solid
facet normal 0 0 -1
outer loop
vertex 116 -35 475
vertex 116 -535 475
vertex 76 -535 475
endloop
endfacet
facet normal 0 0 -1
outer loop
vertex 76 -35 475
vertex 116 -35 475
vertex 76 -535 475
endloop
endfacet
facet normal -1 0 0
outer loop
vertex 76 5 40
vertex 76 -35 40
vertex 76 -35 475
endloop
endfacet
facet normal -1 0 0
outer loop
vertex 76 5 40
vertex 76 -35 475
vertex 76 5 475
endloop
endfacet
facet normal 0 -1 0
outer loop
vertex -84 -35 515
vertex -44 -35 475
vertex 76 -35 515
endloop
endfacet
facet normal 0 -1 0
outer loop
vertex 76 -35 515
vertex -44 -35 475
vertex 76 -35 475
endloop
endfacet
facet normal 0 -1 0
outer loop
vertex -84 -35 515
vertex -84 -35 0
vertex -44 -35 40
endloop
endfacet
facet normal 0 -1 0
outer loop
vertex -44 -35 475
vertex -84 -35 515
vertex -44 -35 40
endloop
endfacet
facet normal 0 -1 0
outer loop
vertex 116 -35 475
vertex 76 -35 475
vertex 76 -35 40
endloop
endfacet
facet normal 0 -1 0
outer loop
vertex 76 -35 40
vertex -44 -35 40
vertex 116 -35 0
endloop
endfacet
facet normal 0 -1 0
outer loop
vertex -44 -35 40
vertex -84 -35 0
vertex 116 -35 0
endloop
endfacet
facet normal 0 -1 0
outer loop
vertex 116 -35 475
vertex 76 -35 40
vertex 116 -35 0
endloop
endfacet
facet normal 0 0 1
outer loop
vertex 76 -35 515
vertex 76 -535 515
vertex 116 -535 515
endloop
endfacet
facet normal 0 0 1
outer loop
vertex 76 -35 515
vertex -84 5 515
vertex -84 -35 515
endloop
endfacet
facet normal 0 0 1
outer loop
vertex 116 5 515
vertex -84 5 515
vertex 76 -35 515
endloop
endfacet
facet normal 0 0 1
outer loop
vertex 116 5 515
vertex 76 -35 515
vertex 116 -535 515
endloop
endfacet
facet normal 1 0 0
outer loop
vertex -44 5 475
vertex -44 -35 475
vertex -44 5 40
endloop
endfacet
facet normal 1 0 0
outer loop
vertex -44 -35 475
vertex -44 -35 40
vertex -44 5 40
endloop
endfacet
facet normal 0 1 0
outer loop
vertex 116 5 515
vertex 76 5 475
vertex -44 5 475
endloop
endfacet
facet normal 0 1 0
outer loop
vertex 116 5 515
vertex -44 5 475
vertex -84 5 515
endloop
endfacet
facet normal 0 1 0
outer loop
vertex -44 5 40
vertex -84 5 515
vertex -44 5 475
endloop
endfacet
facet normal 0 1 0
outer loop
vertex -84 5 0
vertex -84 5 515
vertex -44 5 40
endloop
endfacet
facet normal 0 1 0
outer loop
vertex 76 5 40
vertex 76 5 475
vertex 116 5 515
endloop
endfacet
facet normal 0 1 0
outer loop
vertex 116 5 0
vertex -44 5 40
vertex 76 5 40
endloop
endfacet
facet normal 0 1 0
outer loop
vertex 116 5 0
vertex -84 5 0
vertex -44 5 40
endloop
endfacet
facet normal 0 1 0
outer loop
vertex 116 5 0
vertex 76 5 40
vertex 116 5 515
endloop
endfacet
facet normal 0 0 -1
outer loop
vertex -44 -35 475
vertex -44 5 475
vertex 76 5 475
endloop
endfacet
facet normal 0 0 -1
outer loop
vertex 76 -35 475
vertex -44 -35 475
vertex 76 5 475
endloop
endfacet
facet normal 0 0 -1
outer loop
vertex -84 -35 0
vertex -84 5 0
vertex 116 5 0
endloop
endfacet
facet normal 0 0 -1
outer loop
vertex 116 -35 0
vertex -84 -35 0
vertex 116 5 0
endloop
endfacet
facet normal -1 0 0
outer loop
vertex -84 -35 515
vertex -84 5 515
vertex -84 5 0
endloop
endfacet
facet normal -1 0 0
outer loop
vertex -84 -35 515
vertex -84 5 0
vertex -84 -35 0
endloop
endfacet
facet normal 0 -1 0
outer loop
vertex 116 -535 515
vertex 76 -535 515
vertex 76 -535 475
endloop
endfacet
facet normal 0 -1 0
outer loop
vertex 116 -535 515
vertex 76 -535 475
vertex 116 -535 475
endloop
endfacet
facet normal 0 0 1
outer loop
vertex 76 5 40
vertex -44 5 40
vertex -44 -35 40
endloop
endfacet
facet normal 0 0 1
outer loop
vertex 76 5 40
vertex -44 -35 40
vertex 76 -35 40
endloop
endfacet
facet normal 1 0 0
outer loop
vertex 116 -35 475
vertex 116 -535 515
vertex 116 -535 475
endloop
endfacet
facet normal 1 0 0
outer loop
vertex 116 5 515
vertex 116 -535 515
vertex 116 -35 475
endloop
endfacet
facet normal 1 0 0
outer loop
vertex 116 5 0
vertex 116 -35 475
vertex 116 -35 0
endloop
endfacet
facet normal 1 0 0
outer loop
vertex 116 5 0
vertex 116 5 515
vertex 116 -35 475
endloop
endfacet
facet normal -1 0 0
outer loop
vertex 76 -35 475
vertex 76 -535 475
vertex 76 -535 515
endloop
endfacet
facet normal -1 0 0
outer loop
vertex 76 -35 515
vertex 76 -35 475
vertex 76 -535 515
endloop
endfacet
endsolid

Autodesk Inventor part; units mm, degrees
ref_plane "YZ Plane" through (0, 0, 0) normal (1, 0, 0) x (0, 1, 0)
ref_plane "XZ Plane" through (0, 0, 0) normal (0, 1, 0) x (-1, 0, 0)
sketch "Skizze1" plane through (0, 0, 0) normal (0, 0, 1) x (1, 0, 0)
  line L0 (0, 0) -> (32, 0) construction
  line L1 (-84, 5) -> (-84, -35)
  line L2 (-84, -35) -> (116, -35)
  line L3 (116, -35) -> (116, 5)
  line L4 (-84, 5) -> (116, 5)
  line L5 (0, 0) -> (-84, 0) construction
  line L6 (32, 0) -> (116, 0) construction
  point P0 (16, 5)
  dimension "d0" = 200
  dimension "d1" = 40
  dimension "d2" = 5
extrude "Extrusion1" add sketch "Skizze1" along normal blind 40
sketch "Skizze2" plane through (0, 0, 40) normal (0, 0, 1) x (1, 0, 0)
  line L0 (116, -35) -> (116, 5) projected
  line L1 (-84, 5) -> (-84, -35) projected
  line L2 (116, -35) -> (76, -35)
  line L3 (76, -35) -> (76, 5)
  line L4 (76, 5) -> (116, 5)
  line L5 (-84, -35) -> (-44, -35)
  line L6 (-44, -35) -> (-44, 5)
  line L7 (-44, 5) -> (-84, 5)
  point P0 (0, 0)
extrude "Extrusion2" add sketch "Skizze2" along normal blind 475
sketch "Skizze3" plane through (0, 0, 515) normal (0, 0, 1) x (1, 0, 0)
  line L0 (116, -35) -> (116, 5) projected
  line L1 (-84, 5) -> (-84, -35) projected
  line L2 (76, -35) -> (116, -35) projected
  line L3 (116, -35) -> (-84, -35)
  line L4 (116, 5) -> (-84, 5)
  point P0 (0, 0)
extrude "Extrusion3" add sketch "Skizze3" against normal blind 40
ref_plane "Arbeitsebene1" through (34.1, -565, 450) normal (0, 1, 0) x (0, 0, 1)
sketch "Skizze4" plane through (-84, -35, 0) normal (0, -1, 0) x (1, 0, 0)
  line L0 (136.45, -16.1) -> (139.75, -16.1) construction
  line L1 (138.1, -16.1) -> (138.1, 515) construction
  line L2 (0, 515) -> (200, 515) construction
  line L3 (160, 515) -> (200, 515)
  line L4 (200, 515) -> (200, 475)
  line L5 (200, 475) -> (160, 475)
  line L6 (160, 475) -> (160, 515)
  line L7 (200, 0) -> (200, 515) projected
  point P0 (84, 0)
  dimension "d10" = 40
  dimension "d26" = 40
  dimension "d27" = 0
extrude "Extrusion4" add sketch "Skizze4" along normal blind 500
equation "\"d5\" = höheFrame"
equation "\"höheFrame\" = 475"
properties part number "FrameSide" material "Aluminium 6061, Frame"
